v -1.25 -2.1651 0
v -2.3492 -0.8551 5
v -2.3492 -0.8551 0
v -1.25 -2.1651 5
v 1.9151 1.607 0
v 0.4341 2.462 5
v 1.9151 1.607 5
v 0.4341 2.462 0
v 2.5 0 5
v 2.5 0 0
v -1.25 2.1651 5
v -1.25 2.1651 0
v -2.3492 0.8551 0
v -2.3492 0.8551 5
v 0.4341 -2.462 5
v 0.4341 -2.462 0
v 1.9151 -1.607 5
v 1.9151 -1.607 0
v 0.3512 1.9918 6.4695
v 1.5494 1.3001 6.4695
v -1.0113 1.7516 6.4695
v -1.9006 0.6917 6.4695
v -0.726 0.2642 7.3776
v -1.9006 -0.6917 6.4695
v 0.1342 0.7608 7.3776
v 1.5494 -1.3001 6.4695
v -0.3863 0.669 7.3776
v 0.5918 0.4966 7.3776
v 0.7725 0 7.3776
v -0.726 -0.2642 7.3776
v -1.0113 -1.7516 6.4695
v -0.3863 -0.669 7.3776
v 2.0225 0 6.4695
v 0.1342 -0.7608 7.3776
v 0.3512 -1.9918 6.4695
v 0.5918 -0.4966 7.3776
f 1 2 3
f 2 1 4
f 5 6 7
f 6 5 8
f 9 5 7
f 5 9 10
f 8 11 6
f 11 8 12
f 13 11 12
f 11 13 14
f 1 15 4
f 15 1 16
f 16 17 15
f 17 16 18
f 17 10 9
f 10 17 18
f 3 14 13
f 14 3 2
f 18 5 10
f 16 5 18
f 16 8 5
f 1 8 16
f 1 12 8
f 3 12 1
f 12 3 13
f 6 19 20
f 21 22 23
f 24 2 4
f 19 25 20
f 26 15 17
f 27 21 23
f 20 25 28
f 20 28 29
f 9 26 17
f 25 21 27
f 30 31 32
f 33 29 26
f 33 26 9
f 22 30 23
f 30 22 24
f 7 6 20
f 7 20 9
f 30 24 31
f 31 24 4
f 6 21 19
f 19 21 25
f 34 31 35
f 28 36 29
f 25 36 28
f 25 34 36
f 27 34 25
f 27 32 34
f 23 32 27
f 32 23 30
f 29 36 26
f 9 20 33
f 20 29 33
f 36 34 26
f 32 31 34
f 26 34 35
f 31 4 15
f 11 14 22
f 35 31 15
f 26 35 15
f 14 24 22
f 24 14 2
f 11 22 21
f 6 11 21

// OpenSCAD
module LED (d=5) {
  cylinder(d=d, h=d);
  translate([0, 0, d])
  sphere(d/2);
}

$fn=9;
LED();
